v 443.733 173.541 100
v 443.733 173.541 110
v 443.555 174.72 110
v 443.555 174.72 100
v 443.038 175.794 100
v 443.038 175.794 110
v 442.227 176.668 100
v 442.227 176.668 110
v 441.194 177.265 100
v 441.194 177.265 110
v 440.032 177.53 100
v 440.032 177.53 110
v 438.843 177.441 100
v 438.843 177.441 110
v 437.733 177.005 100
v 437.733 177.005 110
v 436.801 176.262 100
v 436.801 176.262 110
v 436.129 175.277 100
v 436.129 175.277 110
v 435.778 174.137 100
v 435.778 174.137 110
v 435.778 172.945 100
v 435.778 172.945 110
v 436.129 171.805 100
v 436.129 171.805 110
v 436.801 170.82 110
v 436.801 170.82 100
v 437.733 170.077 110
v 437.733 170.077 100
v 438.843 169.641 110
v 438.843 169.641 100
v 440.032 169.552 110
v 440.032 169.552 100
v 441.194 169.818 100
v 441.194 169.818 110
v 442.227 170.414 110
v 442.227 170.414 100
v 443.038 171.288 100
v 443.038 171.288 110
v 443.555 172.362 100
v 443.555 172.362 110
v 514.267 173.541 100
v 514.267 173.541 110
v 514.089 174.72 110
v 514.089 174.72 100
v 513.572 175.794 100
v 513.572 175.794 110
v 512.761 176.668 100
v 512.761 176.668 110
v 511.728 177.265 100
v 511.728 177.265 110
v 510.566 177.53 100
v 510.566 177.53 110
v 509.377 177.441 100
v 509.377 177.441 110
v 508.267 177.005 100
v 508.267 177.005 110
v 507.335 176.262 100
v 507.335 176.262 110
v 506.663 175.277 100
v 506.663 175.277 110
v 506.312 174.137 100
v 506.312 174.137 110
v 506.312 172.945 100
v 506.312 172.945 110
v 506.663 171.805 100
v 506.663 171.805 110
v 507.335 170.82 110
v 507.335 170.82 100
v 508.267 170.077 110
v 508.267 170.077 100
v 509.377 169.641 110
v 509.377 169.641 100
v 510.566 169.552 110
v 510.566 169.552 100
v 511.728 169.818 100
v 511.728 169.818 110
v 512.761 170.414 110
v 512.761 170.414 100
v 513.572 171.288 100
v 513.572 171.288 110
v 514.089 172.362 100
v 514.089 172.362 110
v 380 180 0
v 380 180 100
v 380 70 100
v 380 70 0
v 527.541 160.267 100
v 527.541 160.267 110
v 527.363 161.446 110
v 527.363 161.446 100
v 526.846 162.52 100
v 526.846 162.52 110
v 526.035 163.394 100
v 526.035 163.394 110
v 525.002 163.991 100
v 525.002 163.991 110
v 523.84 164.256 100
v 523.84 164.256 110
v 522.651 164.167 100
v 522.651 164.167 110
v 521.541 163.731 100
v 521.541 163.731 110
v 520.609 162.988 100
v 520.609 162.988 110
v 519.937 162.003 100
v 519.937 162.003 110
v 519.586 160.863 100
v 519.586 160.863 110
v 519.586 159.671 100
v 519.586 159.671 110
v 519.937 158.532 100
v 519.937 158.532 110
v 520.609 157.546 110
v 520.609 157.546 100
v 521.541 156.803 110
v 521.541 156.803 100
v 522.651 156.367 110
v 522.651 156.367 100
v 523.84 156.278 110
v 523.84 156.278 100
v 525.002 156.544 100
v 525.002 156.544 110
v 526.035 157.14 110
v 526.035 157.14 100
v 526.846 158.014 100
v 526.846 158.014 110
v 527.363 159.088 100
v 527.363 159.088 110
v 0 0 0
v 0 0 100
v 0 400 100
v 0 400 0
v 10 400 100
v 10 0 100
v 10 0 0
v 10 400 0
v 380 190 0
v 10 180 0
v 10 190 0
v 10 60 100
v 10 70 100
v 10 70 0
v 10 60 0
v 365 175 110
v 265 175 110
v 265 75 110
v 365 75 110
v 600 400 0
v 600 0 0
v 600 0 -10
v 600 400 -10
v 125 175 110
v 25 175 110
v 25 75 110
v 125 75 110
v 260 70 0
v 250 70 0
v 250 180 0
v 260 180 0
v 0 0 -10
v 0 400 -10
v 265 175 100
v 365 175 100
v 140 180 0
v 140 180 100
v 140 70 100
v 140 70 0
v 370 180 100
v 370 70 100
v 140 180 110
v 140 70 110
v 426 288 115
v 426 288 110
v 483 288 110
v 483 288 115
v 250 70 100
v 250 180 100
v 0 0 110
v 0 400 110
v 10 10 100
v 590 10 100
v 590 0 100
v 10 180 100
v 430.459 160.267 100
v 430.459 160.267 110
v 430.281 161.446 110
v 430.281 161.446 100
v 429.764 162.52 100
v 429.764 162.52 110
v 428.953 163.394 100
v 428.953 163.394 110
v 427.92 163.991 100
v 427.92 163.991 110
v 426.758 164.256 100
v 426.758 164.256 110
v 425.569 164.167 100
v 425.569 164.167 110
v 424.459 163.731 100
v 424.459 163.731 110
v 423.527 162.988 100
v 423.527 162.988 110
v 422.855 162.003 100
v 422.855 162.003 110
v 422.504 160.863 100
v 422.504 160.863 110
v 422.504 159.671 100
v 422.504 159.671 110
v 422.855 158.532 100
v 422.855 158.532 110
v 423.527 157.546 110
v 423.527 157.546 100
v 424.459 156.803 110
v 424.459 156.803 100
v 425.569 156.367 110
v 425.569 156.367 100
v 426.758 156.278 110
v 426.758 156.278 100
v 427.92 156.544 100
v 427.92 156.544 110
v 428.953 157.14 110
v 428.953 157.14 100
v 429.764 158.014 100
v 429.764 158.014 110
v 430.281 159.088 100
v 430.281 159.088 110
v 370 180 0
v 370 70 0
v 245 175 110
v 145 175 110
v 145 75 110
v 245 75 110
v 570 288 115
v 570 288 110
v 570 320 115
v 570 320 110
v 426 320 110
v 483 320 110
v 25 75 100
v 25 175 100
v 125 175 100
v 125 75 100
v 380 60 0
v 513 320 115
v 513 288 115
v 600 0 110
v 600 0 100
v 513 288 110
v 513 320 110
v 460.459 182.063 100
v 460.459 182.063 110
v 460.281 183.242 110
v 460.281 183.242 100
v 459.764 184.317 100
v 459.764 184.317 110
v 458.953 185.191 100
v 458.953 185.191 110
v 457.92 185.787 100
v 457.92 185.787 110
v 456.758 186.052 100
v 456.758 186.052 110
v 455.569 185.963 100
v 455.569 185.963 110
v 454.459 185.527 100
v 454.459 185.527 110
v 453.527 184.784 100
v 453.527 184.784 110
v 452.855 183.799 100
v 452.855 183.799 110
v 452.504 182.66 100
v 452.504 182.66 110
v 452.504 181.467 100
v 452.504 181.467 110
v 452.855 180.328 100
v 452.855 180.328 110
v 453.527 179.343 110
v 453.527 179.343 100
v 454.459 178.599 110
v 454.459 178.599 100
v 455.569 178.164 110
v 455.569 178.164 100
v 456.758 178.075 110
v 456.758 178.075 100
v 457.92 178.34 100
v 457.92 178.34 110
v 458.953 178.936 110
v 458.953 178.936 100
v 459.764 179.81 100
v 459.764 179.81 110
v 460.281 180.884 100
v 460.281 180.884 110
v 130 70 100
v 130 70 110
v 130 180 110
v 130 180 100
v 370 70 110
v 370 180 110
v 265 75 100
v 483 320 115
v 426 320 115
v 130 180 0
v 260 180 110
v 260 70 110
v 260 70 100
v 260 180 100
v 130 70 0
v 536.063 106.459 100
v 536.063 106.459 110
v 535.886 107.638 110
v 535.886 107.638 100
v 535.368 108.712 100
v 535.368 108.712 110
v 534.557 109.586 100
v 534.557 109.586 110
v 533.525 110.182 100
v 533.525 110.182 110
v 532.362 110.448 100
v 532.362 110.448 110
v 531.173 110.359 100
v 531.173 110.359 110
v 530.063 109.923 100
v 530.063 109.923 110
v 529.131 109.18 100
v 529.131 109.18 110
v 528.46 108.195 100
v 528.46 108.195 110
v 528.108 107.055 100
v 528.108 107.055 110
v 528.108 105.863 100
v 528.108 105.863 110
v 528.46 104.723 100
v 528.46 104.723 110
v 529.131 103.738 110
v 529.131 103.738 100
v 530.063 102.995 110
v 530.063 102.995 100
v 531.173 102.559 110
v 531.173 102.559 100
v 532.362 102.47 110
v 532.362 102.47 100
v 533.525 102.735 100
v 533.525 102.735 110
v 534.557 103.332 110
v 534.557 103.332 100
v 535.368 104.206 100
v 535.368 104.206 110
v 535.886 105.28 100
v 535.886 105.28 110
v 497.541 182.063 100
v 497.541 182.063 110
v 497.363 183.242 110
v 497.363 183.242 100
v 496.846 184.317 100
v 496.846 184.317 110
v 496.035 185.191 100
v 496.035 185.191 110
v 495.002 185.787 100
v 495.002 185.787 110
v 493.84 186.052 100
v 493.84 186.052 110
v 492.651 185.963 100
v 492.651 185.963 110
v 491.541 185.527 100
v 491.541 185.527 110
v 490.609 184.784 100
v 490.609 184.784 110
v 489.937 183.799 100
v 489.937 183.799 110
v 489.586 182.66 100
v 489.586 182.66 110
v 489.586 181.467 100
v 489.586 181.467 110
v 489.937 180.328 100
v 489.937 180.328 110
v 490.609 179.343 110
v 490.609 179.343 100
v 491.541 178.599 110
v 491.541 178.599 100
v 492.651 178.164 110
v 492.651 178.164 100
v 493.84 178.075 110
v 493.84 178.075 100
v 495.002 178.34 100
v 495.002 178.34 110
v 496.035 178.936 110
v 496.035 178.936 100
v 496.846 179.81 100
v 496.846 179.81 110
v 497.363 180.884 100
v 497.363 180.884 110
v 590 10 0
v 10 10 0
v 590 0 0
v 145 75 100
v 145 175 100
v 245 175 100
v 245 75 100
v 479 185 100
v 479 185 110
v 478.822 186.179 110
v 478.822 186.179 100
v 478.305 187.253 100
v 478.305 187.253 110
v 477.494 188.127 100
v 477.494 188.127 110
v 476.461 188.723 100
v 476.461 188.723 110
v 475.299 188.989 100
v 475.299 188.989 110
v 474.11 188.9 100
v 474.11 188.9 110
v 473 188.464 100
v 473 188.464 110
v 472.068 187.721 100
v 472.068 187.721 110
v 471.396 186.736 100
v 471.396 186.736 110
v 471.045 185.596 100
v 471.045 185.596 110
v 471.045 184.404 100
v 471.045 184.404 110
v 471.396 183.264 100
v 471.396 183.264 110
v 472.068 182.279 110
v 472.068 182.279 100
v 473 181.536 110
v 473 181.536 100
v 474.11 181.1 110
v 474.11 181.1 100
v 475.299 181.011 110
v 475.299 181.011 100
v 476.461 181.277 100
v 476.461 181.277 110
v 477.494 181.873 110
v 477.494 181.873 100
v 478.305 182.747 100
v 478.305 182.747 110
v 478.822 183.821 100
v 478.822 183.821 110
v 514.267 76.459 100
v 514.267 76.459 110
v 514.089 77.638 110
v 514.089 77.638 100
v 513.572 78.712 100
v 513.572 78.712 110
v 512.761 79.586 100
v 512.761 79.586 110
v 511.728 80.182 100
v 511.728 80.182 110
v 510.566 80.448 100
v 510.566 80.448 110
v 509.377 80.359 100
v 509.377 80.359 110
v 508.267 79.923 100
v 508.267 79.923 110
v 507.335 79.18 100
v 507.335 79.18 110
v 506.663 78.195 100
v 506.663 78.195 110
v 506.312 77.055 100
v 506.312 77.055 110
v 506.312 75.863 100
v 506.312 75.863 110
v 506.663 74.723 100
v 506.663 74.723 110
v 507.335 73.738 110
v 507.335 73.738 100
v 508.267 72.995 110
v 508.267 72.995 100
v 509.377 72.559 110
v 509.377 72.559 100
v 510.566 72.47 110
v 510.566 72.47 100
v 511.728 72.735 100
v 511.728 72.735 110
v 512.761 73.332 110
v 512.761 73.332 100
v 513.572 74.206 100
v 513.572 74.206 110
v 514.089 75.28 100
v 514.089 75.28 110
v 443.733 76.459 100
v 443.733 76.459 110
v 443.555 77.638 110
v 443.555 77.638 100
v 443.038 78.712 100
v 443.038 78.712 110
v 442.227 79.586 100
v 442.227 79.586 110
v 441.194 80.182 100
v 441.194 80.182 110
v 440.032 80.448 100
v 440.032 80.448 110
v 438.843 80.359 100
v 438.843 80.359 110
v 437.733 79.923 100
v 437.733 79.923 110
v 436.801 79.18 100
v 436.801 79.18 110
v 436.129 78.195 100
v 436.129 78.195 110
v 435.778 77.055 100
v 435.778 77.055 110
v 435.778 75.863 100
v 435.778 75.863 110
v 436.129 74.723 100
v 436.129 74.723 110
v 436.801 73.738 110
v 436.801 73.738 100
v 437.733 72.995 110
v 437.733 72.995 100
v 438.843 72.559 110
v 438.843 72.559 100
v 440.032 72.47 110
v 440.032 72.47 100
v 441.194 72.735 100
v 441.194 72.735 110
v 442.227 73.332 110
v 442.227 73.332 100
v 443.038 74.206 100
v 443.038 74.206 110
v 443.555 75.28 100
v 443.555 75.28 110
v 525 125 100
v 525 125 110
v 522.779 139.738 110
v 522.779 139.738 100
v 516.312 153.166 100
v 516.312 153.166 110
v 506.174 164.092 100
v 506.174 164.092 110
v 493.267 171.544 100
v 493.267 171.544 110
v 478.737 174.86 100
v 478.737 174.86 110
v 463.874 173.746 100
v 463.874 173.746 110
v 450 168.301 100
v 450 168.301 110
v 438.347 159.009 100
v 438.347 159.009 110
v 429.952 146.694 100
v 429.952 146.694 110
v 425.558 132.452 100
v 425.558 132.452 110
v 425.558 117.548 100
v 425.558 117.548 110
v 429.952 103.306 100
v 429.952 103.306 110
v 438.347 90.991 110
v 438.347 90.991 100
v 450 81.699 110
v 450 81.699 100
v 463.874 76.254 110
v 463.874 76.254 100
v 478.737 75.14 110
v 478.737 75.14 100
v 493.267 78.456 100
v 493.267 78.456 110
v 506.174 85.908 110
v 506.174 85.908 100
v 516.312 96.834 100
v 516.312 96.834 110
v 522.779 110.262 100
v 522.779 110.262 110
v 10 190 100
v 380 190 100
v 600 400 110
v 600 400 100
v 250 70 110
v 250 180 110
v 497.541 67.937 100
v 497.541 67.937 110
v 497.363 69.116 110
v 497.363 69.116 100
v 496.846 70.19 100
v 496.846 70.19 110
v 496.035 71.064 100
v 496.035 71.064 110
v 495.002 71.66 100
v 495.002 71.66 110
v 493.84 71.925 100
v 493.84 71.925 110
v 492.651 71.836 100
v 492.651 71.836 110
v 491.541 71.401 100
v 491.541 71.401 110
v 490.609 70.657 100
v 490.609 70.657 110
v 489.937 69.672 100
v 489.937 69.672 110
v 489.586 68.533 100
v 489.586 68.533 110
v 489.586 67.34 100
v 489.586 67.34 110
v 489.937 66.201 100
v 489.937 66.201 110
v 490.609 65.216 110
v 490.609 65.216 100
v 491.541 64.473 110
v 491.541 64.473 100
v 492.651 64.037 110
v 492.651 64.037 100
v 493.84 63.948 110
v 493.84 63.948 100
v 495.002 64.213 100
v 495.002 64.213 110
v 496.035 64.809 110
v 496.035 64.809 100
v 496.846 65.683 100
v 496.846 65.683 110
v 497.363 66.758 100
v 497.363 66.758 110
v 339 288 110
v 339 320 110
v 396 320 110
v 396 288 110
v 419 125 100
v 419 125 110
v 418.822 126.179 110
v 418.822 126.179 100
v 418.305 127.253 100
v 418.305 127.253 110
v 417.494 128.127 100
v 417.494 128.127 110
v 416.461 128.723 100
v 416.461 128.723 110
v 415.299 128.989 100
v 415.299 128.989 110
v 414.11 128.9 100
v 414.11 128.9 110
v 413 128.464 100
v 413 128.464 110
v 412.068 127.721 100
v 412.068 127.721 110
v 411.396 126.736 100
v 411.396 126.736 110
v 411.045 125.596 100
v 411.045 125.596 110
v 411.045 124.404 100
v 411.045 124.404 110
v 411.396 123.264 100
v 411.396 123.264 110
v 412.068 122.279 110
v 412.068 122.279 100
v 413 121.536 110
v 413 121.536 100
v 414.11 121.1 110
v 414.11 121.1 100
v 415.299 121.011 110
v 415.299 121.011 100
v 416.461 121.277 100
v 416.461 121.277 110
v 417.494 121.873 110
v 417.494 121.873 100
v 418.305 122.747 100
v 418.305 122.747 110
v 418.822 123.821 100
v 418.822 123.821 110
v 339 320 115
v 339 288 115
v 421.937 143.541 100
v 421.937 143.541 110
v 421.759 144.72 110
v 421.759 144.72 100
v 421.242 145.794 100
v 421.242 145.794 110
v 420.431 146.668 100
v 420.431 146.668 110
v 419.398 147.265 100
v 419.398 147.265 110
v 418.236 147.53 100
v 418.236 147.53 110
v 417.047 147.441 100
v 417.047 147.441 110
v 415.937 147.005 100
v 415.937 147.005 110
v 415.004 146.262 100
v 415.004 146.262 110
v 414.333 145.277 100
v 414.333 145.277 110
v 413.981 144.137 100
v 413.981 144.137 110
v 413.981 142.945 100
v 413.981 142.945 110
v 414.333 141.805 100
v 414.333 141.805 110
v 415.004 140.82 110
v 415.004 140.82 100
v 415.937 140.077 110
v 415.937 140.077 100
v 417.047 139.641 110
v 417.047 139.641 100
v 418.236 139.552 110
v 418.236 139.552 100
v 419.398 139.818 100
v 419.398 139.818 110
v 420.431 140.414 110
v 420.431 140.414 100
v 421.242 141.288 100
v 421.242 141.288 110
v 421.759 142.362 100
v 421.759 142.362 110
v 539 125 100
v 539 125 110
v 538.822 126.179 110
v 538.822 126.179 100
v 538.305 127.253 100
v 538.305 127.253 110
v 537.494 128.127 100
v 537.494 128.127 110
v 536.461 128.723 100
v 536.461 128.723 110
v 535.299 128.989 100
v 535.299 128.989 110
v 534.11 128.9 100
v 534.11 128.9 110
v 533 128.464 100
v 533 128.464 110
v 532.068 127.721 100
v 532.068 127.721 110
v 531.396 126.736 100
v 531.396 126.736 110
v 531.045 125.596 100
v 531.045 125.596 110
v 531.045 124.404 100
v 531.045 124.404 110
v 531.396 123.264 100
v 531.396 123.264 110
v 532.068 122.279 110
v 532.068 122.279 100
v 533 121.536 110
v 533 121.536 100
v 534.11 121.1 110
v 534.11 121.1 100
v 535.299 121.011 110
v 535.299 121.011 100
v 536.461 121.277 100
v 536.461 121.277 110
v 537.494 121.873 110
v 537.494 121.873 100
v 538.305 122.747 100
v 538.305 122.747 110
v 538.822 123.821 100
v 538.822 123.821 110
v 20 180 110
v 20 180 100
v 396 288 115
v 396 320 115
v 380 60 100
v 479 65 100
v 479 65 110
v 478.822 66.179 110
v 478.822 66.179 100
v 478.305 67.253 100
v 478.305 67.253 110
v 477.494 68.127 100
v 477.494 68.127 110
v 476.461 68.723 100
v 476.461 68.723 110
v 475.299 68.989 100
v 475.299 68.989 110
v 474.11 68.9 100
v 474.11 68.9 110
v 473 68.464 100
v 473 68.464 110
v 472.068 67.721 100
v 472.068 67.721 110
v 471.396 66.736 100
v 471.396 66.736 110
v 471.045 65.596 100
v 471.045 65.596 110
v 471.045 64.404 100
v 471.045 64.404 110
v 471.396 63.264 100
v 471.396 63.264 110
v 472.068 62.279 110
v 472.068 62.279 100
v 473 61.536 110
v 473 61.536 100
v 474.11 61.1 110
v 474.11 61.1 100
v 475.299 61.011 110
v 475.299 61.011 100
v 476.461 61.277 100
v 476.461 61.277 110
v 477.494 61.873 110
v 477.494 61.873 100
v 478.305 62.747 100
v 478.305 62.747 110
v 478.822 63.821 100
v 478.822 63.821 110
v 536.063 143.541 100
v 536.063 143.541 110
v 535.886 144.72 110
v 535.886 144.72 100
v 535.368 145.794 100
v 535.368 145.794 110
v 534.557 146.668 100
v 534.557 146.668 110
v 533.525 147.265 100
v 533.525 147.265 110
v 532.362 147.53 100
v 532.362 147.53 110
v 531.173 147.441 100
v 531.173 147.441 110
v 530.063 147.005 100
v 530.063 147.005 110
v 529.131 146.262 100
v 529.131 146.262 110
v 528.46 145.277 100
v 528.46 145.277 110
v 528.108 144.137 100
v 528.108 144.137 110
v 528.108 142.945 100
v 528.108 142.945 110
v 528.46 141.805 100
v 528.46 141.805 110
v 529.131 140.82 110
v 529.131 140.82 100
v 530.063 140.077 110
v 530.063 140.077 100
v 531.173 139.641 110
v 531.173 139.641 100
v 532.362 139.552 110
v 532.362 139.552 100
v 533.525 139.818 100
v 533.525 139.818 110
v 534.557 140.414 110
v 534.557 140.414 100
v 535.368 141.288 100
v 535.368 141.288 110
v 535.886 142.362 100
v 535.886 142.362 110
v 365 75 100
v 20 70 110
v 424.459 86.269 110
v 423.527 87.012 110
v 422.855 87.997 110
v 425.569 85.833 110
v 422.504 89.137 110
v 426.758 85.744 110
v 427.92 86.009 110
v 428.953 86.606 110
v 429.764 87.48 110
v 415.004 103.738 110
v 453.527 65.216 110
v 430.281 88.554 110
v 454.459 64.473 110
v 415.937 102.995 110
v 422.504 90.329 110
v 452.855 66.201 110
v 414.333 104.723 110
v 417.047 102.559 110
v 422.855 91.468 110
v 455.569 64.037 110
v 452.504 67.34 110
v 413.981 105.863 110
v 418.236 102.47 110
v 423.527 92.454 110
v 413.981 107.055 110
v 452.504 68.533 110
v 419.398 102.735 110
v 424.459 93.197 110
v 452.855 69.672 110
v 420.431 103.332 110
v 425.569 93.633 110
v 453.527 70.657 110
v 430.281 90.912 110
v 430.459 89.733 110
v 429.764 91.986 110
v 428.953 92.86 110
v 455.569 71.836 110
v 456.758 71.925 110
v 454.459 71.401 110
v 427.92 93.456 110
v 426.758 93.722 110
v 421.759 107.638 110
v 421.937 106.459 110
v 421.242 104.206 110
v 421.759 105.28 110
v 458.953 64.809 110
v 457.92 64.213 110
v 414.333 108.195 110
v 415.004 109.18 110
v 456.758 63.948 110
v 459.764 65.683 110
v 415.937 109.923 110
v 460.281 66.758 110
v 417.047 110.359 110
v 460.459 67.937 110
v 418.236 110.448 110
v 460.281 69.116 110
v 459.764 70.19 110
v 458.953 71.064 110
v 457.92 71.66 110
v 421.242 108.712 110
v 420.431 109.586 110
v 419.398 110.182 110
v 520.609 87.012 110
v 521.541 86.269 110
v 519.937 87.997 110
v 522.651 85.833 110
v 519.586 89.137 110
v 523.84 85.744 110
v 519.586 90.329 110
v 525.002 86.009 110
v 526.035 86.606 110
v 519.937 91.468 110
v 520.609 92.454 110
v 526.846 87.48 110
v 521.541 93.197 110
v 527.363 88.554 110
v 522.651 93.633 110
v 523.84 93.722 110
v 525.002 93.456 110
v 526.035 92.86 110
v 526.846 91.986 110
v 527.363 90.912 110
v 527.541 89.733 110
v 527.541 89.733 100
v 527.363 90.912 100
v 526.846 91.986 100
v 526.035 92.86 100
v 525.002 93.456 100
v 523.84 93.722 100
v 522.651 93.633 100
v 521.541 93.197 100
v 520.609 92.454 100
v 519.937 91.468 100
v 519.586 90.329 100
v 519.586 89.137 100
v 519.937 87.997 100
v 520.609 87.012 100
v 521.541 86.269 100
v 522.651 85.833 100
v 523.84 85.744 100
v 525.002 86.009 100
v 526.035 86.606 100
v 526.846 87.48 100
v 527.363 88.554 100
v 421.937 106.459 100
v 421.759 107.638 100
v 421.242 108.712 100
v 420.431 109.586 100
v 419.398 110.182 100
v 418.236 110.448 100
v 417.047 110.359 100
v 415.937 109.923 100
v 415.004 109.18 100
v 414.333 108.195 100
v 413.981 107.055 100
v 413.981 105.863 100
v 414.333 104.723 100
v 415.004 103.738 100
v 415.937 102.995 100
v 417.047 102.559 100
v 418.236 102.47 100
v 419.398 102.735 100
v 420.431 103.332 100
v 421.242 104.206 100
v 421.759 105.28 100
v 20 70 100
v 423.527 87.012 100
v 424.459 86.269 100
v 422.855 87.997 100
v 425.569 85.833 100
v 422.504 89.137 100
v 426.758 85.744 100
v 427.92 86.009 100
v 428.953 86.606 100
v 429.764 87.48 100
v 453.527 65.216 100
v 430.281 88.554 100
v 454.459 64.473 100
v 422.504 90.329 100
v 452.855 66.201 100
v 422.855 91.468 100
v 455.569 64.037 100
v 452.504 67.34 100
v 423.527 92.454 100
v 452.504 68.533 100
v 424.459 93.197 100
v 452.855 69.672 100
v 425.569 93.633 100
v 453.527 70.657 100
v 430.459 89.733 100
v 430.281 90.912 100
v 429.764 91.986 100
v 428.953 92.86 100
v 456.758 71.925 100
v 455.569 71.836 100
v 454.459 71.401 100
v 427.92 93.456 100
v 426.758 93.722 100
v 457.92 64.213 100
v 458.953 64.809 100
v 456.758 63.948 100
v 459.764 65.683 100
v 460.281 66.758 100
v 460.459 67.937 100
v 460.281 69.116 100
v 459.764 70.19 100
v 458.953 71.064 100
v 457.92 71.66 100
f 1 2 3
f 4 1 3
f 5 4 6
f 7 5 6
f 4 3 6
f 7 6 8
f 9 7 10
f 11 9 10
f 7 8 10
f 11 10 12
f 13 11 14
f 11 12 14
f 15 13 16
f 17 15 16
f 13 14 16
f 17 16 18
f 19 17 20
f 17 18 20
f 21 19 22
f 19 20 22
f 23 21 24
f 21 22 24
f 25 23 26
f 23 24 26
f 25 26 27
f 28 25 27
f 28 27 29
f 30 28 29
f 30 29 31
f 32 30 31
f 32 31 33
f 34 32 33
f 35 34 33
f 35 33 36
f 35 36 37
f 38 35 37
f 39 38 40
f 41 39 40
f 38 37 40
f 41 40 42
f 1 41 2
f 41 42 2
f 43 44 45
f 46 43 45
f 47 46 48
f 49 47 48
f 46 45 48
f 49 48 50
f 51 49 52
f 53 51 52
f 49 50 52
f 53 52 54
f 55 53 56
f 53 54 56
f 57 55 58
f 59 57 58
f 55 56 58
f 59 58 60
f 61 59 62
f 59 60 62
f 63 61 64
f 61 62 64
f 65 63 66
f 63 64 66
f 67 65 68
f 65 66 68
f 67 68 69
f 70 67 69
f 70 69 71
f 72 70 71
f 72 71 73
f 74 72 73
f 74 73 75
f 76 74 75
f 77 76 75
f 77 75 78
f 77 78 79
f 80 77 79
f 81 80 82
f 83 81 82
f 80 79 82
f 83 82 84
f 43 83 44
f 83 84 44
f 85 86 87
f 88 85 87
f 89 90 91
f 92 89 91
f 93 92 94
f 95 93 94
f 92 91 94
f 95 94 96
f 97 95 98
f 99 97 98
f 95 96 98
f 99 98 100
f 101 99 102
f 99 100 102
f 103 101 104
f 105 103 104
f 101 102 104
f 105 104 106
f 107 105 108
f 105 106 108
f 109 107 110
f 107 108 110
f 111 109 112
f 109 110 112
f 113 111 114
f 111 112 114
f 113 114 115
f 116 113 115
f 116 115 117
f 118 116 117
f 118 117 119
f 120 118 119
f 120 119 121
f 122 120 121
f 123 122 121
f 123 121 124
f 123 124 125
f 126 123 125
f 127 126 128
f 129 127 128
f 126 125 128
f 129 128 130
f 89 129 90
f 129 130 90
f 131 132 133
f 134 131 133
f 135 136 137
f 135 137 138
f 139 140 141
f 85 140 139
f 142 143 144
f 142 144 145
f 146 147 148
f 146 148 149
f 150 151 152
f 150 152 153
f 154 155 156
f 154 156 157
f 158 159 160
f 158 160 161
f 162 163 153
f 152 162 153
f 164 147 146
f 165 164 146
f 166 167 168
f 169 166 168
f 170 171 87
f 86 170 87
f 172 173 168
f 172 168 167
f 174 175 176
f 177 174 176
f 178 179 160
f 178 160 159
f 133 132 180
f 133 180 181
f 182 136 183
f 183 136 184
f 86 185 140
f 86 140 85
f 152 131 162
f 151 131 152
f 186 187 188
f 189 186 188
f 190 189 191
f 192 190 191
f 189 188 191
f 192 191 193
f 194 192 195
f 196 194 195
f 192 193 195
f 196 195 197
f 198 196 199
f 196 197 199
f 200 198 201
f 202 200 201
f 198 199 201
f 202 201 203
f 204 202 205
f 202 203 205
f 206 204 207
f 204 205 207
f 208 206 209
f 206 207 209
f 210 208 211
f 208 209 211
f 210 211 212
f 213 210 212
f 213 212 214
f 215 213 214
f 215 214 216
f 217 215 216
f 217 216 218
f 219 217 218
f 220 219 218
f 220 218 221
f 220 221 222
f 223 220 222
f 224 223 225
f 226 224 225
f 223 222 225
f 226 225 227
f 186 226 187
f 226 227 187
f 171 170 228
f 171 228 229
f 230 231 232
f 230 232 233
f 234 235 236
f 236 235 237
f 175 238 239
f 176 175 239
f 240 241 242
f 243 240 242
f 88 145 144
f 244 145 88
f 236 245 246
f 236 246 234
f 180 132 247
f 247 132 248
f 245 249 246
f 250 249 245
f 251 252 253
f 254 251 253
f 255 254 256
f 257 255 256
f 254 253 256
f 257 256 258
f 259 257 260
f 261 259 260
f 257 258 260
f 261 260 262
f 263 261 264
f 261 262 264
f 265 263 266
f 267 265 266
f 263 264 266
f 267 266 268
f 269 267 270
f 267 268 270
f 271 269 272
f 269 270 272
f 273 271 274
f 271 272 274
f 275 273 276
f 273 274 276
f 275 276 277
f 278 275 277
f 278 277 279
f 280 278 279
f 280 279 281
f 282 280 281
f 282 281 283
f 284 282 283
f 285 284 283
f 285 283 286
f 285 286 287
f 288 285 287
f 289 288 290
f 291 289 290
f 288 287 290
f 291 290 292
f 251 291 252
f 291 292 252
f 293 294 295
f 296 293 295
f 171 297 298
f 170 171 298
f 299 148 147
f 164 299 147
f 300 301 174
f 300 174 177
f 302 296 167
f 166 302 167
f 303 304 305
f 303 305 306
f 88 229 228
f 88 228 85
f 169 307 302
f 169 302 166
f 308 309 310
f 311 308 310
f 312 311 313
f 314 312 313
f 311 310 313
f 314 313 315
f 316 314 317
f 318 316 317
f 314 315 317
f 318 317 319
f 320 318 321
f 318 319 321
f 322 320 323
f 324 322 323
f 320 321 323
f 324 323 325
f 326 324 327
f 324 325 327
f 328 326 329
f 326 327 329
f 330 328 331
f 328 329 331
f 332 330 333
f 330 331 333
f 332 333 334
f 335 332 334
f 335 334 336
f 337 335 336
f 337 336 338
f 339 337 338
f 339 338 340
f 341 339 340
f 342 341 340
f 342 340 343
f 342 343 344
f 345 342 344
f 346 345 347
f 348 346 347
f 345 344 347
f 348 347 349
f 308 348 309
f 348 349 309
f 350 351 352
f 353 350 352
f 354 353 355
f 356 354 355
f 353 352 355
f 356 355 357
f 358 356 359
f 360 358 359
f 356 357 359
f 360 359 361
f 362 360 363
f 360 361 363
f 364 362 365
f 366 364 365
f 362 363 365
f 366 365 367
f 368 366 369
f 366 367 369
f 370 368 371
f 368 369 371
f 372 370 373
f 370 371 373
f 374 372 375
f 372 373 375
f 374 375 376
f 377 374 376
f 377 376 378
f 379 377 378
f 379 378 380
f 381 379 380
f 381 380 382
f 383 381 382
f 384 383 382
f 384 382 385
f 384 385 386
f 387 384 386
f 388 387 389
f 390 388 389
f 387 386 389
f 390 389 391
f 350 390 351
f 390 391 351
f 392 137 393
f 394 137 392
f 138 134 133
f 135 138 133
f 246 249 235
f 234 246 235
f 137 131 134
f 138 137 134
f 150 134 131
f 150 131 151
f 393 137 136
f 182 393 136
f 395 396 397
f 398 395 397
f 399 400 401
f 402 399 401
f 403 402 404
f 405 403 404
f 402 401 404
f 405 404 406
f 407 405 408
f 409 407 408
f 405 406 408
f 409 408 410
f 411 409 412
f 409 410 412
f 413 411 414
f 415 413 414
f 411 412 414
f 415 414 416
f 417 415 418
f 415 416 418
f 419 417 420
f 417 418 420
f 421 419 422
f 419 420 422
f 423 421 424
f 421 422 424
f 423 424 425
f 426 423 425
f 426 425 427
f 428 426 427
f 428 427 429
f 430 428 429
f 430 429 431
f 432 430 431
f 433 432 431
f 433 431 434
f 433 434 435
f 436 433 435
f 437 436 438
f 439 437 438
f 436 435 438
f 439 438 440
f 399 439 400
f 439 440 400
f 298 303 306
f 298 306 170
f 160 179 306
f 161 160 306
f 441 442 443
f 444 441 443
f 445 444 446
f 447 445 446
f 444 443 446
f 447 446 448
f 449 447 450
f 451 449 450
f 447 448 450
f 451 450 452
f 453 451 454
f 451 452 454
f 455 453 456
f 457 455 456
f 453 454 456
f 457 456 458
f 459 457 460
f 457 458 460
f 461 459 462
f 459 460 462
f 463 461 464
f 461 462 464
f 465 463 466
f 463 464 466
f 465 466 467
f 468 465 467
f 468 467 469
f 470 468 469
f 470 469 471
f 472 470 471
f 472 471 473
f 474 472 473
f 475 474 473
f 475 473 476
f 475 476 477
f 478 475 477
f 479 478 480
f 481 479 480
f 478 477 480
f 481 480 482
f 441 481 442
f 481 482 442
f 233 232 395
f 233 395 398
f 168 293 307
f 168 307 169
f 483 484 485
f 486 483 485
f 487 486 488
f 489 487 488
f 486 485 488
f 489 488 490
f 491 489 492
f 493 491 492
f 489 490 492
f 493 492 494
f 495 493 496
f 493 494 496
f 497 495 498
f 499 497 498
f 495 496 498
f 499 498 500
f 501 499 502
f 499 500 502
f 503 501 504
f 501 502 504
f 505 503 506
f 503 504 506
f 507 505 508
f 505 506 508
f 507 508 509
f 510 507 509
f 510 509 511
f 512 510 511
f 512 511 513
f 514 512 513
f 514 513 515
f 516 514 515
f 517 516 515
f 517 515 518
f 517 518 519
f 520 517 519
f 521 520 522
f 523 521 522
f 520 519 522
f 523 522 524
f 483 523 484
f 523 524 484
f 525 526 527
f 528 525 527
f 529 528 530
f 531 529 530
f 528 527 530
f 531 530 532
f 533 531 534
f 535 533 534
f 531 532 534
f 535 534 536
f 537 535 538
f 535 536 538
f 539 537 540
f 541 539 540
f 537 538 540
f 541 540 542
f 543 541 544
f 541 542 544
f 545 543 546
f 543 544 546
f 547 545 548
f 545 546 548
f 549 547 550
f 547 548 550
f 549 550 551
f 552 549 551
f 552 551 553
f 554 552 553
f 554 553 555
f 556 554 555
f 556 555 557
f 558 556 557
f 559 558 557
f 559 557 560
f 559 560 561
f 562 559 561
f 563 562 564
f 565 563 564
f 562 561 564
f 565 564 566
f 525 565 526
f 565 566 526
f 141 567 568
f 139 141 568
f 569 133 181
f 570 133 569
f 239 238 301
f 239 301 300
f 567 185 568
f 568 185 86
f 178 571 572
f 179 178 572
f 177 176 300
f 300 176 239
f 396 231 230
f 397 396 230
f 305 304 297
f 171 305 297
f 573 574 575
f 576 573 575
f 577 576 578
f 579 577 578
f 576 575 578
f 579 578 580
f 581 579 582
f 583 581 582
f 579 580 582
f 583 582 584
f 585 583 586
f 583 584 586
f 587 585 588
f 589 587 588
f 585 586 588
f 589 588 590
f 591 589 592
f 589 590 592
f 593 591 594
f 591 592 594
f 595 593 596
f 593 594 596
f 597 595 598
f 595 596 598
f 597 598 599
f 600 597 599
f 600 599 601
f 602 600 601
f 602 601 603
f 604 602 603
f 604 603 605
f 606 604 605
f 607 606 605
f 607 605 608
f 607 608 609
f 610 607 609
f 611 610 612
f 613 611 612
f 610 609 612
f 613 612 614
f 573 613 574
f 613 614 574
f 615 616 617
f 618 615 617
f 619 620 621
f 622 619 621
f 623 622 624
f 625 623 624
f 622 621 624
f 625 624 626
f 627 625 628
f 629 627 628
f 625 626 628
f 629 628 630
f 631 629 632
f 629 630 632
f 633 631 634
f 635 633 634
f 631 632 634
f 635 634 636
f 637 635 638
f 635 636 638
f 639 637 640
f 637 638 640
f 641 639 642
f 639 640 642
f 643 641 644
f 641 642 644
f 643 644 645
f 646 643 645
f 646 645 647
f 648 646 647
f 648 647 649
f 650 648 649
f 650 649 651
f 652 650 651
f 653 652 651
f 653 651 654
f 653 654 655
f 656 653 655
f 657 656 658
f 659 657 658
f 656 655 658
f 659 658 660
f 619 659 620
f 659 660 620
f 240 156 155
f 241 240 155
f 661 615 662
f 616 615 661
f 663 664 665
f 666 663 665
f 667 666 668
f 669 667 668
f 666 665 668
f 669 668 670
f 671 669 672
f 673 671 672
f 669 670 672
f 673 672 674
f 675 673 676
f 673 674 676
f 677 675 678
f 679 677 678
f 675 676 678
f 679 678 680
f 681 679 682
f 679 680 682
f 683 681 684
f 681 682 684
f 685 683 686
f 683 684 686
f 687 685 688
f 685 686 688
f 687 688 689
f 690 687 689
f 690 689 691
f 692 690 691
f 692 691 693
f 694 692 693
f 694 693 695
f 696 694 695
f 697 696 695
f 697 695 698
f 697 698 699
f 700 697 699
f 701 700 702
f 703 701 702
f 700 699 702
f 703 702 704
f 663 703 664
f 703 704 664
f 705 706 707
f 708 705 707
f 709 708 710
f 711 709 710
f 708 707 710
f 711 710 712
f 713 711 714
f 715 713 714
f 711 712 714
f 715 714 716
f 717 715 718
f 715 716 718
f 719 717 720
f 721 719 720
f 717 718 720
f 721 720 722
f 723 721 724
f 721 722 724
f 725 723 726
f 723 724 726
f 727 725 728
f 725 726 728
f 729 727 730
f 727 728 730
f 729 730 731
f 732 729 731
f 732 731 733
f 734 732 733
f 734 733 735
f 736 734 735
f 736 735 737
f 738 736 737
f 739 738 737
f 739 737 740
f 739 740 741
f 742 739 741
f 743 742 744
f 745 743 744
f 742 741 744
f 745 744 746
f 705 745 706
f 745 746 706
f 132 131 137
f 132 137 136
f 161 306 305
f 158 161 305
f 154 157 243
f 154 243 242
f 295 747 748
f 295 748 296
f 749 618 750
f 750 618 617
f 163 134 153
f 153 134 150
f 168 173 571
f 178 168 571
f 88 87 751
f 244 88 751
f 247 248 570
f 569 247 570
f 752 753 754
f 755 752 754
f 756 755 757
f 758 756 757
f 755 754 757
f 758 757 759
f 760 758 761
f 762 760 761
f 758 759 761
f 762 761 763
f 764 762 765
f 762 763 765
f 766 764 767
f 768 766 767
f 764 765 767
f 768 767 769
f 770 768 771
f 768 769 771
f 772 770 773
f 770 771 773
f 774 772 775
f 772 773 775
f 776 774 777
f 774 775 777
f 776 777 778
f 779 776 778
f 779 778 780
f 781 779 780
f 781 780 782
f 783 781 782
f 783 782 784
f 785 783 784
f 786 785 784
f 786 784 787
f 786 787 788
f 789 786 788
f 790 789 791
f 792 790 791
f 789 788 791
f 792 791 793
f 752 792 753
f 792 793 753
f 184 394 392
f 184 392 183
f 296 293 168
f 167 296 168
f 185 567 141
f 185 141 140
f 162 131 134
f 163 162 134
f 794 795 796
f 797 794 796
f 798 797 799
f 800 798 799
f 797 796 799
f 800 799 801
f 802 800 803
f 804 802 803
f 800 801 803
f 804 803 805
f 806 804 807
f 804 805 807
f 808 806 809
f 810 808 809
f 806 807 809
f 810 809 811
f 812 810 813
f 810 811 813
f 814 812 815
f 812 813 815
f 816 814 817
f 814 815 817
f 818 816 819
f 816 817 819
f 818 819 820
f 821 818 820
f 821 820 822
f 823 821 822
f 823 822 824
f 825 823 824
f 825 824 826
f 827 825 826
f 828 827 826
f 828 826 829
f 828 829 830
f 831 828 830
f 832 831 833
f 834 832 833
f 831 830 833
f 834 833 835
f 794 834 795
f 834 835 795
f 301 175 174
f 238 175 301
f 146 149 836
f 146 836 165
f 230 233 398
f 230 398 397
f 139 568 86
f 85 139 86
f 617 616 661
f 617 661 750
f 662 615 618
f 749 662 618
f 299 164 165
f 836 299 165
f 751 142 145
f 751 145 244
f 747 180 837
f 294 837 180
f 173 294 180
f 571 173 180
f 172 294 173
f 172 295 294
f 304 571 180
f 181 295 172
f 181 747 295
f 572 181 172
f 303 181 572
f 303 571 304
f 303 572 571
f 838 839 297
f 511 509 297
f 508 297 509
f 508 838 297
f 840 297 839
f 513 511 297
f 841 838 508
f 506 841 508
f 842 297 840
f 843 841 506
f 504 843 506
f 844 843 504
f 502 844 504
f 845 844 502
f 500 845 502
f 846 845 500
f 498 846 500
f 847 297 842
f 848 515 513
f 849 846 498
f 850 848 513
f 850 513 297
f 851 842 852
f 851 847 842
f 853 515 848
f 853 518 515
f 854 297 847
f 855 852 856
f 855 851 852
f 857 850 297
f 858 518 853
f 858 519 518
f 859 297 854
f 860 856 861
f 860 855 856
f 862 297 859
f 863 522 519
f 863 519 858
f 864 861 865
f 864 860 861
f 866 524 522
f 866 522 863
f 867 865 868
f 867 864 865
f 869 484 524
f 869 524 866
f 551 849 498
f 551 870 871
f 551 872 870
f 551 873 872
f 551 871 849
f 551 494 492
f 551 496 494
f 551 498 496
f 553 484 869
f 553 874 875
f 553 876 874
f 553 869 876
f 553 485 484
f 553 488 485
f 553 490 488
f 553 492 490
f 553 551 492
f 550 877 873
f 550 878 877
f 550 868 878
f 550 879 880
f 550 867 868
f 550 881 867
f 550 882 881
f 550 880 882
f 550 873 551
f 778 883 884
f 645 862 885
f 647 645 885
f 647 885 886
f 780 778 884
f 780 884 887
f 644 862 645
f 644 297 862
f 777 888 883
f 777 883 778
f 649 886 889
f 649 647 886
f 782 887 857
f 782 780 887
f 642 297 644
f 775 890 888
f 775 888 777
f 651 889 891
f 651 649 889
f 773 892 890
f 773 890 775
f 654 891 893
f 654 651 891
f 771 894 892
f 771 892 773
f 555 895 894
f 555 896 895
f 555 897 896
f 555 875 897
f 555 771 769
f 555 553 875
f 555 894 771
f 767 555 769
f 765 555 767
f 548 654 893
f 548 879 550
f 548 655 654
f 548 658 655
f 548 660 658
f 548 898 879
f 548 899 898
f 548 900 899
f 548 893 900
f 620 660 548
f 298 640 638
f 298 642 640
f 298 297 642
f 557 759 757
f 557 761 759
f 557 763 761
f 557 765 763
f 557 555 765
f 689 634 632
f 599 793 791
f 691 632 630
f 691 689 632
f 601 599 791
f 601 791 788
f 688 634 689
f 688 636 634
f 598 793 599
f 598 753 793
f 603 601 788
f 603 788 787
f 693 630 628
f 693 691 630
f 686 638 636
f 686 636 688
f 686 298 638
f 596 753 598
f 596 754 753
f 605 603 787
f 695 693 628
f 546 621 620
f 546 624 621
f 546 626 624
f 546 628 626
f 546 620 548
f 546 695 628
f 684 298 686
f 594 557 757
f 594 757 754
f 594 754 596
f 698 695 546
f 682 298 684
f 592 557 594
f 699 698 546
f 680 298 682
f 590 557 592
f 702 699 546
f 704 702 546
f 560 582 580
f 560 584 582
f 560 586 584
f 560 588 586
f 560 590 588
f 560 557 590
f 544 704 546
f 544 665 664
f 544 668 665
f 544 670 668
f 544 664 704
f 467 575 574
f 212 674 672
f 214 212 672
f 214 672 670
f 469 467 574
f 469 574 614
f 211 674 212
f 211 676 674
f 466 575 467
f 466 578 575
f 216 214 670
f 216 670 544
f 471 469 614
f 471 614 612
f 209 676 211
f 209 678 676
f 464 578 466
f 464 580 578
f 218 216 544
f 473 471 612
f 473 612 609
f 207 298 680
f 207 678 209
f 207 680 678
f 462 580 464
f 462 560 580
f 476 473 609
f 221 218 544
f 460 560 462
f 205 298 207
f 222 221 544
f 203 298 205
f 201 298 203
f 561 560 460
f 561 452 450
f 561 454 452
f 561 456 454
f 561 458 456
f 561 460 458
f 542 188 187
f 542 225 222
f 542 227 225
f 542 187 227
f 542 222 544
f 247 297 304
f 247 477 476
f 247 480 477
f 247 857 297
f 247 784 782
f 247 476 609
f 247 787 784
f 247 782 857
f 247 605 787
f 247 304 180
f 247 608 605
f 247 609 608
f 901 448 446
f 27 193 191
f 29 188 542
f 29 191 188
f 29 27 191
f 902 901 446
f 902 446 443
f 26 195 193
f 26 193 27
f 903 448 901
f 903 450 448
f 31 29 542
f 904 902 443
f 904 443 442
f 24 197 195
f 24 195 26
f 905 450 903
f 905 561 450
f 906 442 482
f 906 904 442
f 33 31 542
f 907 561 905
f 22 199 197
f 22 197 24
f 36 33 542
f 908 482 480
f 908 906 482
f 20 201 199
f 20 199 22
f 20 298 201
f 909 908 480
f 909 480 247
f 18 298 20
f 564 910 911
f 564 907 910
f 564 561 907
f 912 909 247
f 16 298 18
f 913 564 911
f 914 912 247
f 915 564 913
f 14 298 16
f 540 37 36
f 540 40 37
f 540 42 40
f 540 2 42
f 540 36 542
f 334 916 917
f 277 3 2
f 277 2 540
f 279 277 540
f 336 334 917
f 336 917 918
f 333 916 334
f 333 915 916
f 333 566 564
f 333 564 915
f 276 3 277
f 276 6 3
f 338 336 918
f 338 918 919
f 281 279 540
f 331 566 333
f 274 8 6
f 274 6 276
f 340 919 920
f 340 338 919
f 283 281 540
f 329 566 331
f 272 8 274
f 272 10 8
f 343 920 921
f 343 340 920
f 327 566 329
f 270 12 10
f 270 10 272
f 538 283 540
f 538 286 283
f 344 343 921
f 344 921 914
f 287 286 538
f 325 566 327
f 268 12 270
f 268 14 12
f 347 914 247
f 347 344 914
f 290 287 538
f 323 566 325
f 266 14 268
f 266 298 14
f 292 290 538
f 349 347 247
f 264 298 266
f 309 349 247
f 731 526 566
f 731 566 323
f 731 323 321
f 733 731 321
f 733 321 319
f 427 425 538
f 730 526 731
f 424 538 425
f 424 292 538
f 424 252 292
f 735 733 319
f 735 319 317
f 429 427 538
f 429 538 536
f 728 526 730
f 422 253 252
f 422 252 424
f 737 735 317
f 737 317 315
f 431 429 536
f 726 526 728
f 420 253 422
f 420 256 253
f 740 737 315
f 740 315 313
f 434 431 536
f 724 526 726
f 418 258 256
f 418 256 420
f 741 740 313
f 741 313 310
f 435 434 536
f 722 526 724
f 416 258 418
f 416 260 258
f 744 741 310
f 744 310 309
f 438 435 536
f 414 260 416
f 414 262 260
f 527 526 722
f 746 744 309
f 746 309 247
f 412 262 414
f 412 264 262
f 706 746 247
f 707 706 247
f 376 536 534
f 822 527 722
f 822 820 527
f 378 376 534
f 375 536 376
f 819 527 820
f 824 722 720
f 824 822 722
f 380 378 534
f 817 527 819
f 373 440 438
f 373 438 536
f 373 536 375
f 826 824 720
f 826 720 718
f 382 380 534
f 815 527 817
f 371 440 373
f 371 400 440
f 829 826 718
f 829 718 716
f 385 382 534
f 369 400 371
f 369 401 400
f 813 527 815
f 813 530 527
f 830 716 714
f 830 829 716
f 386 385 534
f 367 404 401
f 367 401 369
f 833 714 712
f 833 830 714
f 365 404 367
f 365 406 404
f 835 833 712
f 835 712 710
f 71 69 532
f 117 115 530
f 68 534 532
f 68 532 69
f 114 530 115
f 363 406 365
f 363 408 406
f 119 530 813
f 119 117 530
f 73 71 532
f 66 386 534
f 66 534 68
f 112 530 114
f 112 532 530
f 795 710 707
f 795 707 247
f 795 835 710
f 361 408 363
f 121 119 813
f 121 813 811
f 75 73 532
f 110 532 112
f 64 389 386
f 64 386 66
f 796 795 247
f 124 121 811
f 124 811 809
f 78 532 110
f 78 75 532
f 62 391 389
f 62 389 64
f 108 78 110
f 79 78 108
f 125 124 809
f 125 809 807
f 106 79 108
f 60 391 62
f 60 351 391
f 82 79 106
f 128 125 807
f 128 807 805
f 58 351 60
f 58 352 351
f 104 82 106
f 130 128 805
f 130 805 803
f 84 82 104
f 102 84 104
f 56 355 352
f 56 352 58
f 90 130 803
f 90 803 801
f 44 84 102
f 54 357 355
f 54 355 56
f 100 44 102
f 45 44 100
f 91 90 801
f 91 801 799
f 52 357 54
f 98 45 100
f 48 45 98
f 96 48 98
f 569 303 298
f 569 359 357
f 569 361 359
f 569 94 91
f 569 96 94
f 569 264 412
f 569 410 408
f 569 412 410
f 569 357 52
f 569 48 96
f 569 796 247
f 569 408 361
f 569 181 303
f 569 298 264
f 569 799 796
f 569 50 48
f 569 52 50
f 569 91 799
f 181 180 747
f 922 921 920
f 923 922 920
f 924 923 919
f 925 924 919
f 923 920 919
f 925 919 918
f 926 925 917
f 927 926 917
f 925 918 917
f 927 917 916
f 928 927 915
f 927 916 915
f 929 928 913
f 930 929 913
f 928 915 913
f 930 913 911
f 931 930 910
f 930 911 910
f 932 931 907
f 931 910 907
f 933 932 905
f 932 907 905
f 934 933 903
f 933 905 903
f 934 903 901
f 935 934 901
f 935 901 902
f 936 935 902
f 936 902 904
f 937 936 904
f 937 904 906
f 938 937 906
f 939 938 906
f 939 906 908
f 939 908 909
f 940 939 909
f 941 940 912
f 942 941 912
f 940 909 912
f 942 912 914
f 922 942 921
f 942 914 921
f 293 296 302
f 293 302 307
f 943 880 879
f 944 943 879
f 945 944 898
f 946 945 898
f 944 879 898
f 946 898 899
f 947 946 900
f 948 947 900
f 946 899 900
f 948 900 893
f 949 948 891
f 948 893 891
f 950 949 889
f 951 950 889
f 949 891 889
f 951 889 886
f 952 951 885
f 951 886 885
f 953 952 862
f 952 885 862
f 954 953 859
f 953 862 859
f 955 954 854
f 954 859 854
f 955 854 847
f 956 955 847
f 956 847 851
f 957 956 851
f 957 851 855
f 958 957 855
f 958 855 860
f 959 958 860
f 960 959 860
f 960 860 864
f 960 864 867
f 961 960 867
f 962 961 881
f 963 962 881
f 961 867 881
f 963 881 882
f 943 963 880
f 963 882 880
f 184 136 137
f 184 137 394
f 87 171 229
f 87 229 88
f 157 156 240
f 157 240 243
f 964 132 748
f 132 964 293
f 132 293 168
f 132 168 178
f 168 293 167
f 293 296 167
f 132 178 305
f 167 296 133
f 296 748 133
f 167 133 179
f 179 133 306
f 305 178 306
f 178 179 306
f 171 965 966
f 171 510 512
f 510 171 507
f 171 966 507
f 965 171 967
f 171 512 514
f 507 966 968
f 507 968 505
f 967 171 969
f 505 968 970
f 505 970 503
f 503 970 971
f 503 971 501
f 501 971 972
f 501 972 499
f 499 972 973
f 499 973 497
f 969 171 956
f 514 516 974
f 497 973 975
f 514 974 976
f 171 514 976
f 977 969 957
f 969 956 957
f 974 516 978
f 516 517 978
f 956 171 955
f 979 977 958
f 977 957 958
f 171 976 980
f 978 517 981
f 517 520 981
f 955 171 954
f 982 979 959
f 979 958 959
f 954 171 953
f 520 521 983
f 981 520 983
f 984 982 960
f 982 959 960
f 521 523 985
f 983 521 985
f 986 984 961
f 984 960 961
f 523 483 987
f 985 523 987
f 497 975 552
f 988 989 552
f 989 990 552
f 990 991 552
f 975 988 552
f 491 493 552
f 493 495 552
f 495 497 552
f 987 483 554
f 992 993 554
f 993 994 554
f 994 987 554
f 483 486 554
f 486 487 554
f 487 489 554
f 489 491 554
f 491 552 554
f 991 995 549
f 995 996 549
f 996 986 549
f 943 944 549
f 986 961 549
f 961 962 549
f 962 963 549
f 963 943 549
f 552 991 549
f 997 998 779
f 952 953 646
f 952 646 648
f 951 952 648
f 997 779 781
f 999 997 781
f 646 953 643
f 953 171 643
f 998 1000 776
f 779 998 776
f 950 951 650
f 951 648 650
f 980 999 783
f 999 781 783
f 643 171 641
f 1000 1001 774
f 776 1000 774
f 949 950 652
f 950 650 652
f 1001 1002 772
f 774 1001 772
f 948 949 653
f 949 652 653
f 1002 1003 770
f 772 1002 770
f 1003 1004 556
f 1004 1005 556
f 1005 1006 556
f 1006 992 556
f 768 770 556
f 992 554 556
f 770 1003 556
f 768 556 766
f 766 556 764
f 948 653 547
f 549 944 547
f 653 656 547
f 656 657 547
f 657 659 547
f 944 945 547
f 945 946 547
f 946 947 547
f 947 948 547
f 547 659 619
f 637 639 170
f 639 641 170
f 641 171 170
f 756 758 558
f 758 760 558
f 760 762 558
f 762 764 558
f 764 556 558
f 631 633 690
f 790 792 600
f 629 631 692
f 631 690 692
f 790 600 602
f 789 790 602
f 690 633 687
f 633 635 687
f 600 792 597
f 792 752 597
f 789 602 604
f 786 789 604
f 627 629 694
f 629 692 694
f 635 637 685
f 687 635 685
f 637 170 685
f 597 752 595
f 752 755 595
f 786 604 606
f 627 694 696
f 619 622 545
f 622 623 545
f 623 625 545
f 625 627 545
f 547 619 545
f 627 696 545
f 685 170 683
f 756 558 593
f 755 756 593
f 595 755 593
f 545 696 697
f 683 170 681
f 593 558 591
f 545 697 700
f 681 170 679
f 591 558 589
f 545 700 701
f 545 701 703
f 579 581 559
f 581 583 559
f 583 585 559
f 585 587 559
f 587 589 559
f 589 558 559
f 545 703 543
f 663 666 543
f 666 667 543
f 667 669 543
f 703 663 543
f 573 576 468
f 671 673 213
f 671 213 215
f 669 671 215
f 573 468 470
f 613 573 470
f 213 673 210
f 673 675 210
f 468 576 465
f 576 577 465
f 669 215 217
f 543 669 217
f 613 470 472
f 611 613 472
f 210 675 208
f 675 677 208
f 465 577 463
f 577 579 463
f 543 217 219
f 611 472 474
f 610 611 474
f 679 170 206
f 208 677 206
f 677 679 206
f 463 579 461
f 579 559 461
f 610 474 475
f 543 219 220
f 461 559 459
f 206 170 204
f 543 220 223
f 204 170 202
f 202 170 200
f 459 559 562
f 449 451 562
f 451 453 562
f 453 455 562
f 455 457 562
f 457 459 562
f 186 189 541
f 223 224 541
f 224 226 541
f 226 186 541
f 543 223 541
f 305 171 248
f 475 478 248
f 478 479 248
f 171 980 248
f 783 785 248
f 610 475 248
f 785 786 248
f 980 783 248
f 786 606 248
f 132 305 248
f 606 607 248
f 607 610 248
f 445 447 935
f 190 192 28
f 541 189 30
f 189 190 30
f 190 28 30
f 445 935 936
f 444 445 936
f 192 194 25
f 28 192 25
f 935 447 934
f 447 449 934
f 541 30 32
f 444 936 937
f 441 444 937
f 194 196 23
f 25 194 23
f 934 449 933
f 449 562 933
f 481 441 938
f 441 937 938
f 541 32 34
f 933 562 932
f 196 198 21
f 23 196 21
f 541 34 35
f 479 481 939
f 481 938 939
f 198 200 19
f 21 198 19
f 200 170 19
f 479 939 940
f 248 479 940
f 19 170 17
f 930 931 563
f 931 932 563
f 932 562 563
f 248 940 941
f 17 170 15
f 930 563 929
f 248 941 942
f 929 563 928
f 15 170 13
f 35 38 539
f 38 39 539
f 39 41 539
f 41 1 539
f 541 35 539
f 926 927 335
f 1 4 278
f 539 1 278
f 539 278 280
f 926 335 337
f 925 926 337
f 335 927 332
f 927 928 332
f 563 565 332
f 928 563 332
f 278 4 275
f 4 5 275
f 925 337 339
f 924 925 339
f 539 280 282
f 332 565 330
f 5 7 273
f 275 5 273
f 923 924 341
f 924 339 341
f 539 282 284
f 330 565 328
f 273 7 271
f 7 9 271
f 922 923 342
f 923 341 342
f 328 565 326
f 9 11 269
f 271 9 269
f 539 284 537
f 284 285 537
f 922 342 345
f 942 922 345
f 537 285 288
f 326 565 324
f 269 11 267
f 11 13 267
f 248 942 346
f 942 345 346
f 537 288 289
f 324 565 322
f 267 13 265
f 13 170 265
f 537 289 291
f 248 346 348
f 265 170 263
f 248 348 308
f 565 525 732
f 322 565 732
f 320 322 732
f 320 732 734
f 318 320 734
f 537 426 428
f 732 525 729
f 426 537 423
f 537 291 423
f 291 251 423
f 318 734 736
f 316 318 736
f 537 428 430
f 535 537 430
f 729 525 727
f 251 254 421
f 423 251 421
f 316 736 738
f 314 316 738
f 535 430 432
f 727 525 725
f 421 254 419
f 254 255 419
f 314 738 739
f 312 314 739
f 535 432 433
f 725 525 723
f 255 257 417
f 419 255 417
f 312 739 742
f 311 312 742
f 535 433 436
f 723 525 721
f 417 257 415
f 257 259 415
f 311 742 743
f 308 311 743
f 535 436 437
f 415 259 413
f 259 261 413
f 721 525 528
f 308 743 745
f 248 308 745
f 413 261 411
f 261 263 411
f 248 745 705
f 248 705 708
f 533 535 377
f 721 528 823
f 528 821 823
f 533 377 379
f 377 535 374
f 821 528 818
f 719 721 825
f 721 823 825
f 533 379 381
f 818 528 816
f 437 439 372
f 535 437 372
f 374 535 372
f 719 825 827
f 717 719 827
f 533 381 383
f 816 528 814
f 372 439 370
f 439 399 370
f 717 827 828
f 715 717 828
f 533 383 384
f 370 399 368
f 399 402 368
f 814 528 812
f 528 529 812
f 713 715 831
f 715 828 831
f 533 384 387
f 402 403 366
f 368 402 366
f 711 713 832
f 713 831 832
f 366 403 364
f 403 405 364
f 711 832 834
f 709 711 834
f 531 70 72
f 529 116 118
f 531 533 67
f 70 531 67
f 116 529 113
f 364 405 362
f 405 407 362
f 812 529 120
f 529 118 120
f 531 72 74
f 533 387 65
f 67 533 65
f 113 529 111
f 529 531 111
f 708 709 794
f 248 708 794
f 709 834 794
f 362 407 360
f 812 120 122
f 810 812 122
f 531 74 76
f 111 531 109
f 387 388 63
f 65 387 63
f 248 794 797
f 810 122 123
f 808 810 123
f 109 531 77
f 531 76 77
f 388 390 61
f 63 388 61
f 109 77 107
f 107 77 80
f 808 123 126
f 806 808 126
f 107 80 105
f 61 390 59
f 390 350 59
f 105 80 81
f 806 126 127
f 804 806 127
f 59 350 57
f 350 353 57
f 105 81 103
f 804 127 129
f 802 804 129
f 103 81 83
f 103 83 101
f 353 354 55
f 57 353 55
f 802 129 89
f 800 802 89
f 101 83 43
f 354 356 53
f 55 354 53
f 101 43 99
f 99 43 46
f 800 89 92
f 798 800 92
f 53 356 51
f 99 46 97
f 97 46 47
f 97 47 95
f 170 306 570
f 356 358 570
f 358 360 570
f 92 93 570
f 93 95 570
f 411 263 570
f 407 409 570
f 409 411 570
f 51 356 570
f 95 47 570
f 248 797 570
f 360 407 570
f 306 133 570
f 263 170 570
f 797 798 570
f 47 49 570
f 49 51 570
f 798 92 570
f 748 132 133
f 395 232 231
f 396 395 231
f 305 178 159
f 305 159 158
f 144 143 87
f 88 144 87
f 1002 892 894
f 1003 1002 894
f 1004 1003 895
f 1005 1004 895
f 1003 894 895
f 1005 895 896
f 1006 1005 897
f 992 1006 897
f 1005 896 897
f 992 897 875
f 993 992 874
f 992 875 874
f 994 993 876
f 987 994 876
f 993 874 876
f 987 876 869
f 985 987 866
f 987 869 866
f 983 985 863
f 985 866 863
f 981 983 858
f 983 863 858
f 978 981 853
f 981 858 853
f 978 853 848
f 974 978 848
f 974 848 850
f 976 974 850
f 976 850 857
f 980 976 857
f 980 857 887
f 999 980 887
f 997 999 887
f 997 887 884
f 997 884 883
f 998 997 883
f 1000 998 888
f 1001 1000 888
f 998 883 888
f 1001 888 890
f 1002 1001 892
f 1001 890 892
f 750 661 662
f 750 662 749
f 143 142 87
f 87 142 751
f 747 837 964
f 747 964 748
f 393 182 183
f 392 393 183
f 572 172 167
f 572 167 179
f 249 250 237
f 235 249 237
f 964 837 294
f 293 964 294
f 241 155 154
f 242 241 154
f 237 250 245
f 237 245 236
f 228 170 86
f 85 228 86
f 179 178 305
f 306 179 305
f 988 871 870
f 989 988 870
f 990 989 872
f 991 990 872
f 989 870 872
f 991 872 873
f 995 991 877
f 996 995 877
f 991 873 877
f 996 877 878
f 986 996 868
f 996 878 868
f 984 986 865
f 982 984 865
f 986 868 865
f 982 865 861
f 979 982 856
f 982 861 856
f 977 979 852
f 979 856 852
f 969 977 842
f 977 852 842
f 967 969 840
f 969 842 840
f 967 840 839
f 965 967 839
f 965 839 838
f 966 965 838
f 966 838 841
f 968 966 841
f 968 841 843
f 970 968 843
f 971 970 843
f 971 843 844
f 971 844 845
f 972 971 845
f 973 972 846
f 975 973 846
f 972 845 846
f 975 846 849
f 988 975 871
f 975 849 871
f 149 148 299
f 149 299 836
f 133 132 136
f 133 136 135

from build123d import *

# Parameters (mm, degrees)
F0_W      = 600
F0_H      = 400
F1_DEPTH  = 10
F2_W      = 400
F2_H      = 100
F3_DEPTH  = 10
F4_W      = 580
F4_H      = 100
F5_DEPTH  = 10
F6_W      = 600
F6_H      = 400
F7_DEPTH  = 10
F8_W      = 110
F8_H      = 110
F8_W_2    = 100
F8_H_2    = 100
F9_DEPTH  = 10
F10_W     = 10
F10_H     = 110
F11_DEPTH = 100
F12_W     = 370
F12_H     = 10
F13_DEPTH = 100
F14_R     = 50
F14_R_2   = 4
F15_DEPTH = 10
F16_W     = 57
F16_H     = 32
F17_DEPTH = 5


with BuildPart() as f1:
    # F0 (on Top) → F1 (new body)
    with BuildSketch(Plane.XY):
        with Locations((300, 200)):
            Rectangle(F0_W, F0_H)
    extrude(amount=-F1_DEPTH)


with BuildPart() as f3:
    # F2 (on Right) → F3 (new body)
    with BuildSketch(Plane.YZ):
        with Locations((200, 50)):
            Rectangle(F2_W, F2_H)
    extrude(amount=F3_DEPTH)


with BuildPart() as f5:
    # F4 (on Front) → F5 (new body)
    with BuildSketch(Plane.XZ):
        with Locations((300, 50)):
            Rectangle(F4_W, F4_H)
    extrude(amount=-F5_DEPTH)


with BuildPart() as f7:
    # F6 (on face) → F7 (new body)
    with BuildSketch(Plane.XY.offset(100)):
        with Locations((300, 200)):
            Rectangle(F6_W, F6_H)
    extrude(amount=F7_DEPTH)

    # F8 (on face) → F9 (cut, through all)
    with BuildSketch(Plane.XY.offset(110)):
        with Locations((75, 125)):
            Rectangle(F8_W, F8_H)
        with Locations((75, 125)):
            Rectangle(F8_W_2, F8_H_2, mode=Mode.SUBTRACT)
        with Locations((195, 125)):
            Rectangle(F8_W, F8_H)
        with Locations((195, 125)):
            Rectangle(F8_W_2, F8_H_2, mode=Mode.SUBTRACT)
        with Locations((315, 125)):
            Rectangle(F8_W, F8_H)
        with Locations((315, 125)):
            Rectangle(F8_W_2, F8_H_2, mode=Mode.SUBTRACT)
    extrude(amount=-F9_DEPTH, mode=Mode.SUBTRACT)

    # F14 (on face) → F15 (cut, through all)
    with BuildSketch(Plane.XY.offset(110)):
        with Locations((475, 125)):
            Circle(F14_R)
        with Locations((415, 125)):
            Circle(F14_R_2)
        with Locations((417.9366090223, 106.4589803375)):
            Circle(F14_R_2)
        with Locations((426.4589803375, 89.7328848625)):
            Circle(F14_R_2)
        with Locations((439.7328848625, 76.4589803375)):
            Circle(F14_R_2)
        with Locations((456.4589803375, 67.9366090223)):
            Circle(F14_R_2)
        with Locations((475, 65)):
            Circle(F14_R_2)
        with Locations((493.5410196625, 67.9366090223)):
            Circle(F14_R_2)
        with Locations((510.2671151375, 76.4589803375)):
            Circle(F14_R_2)
        with Locations((523.5410196625, 89.7328848625)):
            Circle(F14_R_2)
        with Locations((532.0633909777, 106.4589803375)):
            Circle(F14_R_2)
        with Locations((523.5410196625, 160.2671151375)):
            Circle(F14_R_2)
        with Locations((510.2671151375, 173.5410196625)):
            Circle(F14_R_2)
        with Locations((493.5410196625, 182.0633909777)):
            Circle(F14_R_2)
        with Locations((475, 185)):
            Circle(F14_R_2)
        with Locations((456.4589803375, 182.0633909777)):
            Circle(F14_R_2)
        with Locations((439.7328848625, 173.5410196625)):
            Circle(F14_R_2)
        with Locations((426.4589803375, 160.2671151375)):
            Circle(F14_R_2)
        with Locations((417.9366090223, 143.5410196625)):
            Circle(F14_R_2)
        with Locations((535, 125)):
            Circle(F14_R_2)
        with Locations((532.0633909777, 143.5410196625)):
            Circle(F14_R_2)
    extrude(amount=-F15_DEPTH, mode=Mode.SUBTRACT)


with BuildPart() as f11:
    # F10 (on face) → F11 (new body, through all)
    with BuildSketch(Plane(origin=(0, 0, 100), x_dir=(1, 0, 0), z_dir=(0, 0, -1))):
        with Locations((135, -125)):
            Rectangle(F10_W, F10_H)
    extrude(amount=F11_DEPTH)


with BuildPart() as f11b:
    # F10 (on face) → F11, piece 2 (new body, through all)
    with BuildSketch(Plane(origin=(0, 0, 100), x_dir=(1, 0, 0), z_dir=(0, 0, -1))):
        with Locations((255, -125)):
            Rectangle(F10_W, F10_H)
    extrude(amount=F11_DEPTH)


with BuildPart() as f11c:
    # F10 (on face) → F11, piece 3 (new body, through all)
    with BuildSketch(Plane(origin=(0, 0, 100), x_dir=(1, 0, 0), z_dir=(0, 0, -1))):
        with Locations((375, -125)):
            Rectangle(F10_W, F10_H)
    extrude(amount=F11_DEPTH)


with BuildPart() as f13:
    # F12 (on face) → F13 (new body, through all)
    with BuildSketch(Plane(origin=(0, 0, 100), x_dir=(1, 0, 0), z_dir=(0, 0, -1))):
        with Locations((195, -185)):
            Rectangle(F12_W, F12_H)
    extrude(amount=F13_DEPTH)


with BuildPart() as f13b:
    # F12 (on face) → F13, piece 2 (new body, through all)
    with BuildSketch(Plane(origin=(0, 0, 100), x_dir=(1, 0, 0), z_dir=(0, 0, -1))):
        with Locations((195, -65)):
            Rectangle(F12_W, F12_H)
    extrude(amount=F13_DEPTH)


with BuildPart() as f17:
    # F16 (on face) → F17 (new body)
    with BuildSketch(Plane.XY.offset(110)):
        with Locations((541.5, 304)):
            Rectangle(F16_W, F16_H)
    extrude(amount=F17_DEPTH)


with BuildPart() as f17b:
    # F16 (on face) → F17, piece 2 (new body)
    with BuildSketch(Plane.XY.offset(110)):
        with Locations((454.5, 304)):
            Rectangle(F16_W, F16_H)
    extrude(amount=F17_DEPTH)


with BuildPart() as f17c:
    # F16 (on face) → F17, piece 3 (new body)
    with BuildSketch(Plane.XY.offset(110)):
        with Locations((367.5, 304)):
            Rectangle(F16_W, F16_H)
    extrude(amount=F17_DEPTH)


solid = Compound([f1.part, f3.part, f5.part, f7.part, f11.part, f11b.part, f11c.part, f13.part, f13b.part, f17.part, f17b.part, f17c.part])
